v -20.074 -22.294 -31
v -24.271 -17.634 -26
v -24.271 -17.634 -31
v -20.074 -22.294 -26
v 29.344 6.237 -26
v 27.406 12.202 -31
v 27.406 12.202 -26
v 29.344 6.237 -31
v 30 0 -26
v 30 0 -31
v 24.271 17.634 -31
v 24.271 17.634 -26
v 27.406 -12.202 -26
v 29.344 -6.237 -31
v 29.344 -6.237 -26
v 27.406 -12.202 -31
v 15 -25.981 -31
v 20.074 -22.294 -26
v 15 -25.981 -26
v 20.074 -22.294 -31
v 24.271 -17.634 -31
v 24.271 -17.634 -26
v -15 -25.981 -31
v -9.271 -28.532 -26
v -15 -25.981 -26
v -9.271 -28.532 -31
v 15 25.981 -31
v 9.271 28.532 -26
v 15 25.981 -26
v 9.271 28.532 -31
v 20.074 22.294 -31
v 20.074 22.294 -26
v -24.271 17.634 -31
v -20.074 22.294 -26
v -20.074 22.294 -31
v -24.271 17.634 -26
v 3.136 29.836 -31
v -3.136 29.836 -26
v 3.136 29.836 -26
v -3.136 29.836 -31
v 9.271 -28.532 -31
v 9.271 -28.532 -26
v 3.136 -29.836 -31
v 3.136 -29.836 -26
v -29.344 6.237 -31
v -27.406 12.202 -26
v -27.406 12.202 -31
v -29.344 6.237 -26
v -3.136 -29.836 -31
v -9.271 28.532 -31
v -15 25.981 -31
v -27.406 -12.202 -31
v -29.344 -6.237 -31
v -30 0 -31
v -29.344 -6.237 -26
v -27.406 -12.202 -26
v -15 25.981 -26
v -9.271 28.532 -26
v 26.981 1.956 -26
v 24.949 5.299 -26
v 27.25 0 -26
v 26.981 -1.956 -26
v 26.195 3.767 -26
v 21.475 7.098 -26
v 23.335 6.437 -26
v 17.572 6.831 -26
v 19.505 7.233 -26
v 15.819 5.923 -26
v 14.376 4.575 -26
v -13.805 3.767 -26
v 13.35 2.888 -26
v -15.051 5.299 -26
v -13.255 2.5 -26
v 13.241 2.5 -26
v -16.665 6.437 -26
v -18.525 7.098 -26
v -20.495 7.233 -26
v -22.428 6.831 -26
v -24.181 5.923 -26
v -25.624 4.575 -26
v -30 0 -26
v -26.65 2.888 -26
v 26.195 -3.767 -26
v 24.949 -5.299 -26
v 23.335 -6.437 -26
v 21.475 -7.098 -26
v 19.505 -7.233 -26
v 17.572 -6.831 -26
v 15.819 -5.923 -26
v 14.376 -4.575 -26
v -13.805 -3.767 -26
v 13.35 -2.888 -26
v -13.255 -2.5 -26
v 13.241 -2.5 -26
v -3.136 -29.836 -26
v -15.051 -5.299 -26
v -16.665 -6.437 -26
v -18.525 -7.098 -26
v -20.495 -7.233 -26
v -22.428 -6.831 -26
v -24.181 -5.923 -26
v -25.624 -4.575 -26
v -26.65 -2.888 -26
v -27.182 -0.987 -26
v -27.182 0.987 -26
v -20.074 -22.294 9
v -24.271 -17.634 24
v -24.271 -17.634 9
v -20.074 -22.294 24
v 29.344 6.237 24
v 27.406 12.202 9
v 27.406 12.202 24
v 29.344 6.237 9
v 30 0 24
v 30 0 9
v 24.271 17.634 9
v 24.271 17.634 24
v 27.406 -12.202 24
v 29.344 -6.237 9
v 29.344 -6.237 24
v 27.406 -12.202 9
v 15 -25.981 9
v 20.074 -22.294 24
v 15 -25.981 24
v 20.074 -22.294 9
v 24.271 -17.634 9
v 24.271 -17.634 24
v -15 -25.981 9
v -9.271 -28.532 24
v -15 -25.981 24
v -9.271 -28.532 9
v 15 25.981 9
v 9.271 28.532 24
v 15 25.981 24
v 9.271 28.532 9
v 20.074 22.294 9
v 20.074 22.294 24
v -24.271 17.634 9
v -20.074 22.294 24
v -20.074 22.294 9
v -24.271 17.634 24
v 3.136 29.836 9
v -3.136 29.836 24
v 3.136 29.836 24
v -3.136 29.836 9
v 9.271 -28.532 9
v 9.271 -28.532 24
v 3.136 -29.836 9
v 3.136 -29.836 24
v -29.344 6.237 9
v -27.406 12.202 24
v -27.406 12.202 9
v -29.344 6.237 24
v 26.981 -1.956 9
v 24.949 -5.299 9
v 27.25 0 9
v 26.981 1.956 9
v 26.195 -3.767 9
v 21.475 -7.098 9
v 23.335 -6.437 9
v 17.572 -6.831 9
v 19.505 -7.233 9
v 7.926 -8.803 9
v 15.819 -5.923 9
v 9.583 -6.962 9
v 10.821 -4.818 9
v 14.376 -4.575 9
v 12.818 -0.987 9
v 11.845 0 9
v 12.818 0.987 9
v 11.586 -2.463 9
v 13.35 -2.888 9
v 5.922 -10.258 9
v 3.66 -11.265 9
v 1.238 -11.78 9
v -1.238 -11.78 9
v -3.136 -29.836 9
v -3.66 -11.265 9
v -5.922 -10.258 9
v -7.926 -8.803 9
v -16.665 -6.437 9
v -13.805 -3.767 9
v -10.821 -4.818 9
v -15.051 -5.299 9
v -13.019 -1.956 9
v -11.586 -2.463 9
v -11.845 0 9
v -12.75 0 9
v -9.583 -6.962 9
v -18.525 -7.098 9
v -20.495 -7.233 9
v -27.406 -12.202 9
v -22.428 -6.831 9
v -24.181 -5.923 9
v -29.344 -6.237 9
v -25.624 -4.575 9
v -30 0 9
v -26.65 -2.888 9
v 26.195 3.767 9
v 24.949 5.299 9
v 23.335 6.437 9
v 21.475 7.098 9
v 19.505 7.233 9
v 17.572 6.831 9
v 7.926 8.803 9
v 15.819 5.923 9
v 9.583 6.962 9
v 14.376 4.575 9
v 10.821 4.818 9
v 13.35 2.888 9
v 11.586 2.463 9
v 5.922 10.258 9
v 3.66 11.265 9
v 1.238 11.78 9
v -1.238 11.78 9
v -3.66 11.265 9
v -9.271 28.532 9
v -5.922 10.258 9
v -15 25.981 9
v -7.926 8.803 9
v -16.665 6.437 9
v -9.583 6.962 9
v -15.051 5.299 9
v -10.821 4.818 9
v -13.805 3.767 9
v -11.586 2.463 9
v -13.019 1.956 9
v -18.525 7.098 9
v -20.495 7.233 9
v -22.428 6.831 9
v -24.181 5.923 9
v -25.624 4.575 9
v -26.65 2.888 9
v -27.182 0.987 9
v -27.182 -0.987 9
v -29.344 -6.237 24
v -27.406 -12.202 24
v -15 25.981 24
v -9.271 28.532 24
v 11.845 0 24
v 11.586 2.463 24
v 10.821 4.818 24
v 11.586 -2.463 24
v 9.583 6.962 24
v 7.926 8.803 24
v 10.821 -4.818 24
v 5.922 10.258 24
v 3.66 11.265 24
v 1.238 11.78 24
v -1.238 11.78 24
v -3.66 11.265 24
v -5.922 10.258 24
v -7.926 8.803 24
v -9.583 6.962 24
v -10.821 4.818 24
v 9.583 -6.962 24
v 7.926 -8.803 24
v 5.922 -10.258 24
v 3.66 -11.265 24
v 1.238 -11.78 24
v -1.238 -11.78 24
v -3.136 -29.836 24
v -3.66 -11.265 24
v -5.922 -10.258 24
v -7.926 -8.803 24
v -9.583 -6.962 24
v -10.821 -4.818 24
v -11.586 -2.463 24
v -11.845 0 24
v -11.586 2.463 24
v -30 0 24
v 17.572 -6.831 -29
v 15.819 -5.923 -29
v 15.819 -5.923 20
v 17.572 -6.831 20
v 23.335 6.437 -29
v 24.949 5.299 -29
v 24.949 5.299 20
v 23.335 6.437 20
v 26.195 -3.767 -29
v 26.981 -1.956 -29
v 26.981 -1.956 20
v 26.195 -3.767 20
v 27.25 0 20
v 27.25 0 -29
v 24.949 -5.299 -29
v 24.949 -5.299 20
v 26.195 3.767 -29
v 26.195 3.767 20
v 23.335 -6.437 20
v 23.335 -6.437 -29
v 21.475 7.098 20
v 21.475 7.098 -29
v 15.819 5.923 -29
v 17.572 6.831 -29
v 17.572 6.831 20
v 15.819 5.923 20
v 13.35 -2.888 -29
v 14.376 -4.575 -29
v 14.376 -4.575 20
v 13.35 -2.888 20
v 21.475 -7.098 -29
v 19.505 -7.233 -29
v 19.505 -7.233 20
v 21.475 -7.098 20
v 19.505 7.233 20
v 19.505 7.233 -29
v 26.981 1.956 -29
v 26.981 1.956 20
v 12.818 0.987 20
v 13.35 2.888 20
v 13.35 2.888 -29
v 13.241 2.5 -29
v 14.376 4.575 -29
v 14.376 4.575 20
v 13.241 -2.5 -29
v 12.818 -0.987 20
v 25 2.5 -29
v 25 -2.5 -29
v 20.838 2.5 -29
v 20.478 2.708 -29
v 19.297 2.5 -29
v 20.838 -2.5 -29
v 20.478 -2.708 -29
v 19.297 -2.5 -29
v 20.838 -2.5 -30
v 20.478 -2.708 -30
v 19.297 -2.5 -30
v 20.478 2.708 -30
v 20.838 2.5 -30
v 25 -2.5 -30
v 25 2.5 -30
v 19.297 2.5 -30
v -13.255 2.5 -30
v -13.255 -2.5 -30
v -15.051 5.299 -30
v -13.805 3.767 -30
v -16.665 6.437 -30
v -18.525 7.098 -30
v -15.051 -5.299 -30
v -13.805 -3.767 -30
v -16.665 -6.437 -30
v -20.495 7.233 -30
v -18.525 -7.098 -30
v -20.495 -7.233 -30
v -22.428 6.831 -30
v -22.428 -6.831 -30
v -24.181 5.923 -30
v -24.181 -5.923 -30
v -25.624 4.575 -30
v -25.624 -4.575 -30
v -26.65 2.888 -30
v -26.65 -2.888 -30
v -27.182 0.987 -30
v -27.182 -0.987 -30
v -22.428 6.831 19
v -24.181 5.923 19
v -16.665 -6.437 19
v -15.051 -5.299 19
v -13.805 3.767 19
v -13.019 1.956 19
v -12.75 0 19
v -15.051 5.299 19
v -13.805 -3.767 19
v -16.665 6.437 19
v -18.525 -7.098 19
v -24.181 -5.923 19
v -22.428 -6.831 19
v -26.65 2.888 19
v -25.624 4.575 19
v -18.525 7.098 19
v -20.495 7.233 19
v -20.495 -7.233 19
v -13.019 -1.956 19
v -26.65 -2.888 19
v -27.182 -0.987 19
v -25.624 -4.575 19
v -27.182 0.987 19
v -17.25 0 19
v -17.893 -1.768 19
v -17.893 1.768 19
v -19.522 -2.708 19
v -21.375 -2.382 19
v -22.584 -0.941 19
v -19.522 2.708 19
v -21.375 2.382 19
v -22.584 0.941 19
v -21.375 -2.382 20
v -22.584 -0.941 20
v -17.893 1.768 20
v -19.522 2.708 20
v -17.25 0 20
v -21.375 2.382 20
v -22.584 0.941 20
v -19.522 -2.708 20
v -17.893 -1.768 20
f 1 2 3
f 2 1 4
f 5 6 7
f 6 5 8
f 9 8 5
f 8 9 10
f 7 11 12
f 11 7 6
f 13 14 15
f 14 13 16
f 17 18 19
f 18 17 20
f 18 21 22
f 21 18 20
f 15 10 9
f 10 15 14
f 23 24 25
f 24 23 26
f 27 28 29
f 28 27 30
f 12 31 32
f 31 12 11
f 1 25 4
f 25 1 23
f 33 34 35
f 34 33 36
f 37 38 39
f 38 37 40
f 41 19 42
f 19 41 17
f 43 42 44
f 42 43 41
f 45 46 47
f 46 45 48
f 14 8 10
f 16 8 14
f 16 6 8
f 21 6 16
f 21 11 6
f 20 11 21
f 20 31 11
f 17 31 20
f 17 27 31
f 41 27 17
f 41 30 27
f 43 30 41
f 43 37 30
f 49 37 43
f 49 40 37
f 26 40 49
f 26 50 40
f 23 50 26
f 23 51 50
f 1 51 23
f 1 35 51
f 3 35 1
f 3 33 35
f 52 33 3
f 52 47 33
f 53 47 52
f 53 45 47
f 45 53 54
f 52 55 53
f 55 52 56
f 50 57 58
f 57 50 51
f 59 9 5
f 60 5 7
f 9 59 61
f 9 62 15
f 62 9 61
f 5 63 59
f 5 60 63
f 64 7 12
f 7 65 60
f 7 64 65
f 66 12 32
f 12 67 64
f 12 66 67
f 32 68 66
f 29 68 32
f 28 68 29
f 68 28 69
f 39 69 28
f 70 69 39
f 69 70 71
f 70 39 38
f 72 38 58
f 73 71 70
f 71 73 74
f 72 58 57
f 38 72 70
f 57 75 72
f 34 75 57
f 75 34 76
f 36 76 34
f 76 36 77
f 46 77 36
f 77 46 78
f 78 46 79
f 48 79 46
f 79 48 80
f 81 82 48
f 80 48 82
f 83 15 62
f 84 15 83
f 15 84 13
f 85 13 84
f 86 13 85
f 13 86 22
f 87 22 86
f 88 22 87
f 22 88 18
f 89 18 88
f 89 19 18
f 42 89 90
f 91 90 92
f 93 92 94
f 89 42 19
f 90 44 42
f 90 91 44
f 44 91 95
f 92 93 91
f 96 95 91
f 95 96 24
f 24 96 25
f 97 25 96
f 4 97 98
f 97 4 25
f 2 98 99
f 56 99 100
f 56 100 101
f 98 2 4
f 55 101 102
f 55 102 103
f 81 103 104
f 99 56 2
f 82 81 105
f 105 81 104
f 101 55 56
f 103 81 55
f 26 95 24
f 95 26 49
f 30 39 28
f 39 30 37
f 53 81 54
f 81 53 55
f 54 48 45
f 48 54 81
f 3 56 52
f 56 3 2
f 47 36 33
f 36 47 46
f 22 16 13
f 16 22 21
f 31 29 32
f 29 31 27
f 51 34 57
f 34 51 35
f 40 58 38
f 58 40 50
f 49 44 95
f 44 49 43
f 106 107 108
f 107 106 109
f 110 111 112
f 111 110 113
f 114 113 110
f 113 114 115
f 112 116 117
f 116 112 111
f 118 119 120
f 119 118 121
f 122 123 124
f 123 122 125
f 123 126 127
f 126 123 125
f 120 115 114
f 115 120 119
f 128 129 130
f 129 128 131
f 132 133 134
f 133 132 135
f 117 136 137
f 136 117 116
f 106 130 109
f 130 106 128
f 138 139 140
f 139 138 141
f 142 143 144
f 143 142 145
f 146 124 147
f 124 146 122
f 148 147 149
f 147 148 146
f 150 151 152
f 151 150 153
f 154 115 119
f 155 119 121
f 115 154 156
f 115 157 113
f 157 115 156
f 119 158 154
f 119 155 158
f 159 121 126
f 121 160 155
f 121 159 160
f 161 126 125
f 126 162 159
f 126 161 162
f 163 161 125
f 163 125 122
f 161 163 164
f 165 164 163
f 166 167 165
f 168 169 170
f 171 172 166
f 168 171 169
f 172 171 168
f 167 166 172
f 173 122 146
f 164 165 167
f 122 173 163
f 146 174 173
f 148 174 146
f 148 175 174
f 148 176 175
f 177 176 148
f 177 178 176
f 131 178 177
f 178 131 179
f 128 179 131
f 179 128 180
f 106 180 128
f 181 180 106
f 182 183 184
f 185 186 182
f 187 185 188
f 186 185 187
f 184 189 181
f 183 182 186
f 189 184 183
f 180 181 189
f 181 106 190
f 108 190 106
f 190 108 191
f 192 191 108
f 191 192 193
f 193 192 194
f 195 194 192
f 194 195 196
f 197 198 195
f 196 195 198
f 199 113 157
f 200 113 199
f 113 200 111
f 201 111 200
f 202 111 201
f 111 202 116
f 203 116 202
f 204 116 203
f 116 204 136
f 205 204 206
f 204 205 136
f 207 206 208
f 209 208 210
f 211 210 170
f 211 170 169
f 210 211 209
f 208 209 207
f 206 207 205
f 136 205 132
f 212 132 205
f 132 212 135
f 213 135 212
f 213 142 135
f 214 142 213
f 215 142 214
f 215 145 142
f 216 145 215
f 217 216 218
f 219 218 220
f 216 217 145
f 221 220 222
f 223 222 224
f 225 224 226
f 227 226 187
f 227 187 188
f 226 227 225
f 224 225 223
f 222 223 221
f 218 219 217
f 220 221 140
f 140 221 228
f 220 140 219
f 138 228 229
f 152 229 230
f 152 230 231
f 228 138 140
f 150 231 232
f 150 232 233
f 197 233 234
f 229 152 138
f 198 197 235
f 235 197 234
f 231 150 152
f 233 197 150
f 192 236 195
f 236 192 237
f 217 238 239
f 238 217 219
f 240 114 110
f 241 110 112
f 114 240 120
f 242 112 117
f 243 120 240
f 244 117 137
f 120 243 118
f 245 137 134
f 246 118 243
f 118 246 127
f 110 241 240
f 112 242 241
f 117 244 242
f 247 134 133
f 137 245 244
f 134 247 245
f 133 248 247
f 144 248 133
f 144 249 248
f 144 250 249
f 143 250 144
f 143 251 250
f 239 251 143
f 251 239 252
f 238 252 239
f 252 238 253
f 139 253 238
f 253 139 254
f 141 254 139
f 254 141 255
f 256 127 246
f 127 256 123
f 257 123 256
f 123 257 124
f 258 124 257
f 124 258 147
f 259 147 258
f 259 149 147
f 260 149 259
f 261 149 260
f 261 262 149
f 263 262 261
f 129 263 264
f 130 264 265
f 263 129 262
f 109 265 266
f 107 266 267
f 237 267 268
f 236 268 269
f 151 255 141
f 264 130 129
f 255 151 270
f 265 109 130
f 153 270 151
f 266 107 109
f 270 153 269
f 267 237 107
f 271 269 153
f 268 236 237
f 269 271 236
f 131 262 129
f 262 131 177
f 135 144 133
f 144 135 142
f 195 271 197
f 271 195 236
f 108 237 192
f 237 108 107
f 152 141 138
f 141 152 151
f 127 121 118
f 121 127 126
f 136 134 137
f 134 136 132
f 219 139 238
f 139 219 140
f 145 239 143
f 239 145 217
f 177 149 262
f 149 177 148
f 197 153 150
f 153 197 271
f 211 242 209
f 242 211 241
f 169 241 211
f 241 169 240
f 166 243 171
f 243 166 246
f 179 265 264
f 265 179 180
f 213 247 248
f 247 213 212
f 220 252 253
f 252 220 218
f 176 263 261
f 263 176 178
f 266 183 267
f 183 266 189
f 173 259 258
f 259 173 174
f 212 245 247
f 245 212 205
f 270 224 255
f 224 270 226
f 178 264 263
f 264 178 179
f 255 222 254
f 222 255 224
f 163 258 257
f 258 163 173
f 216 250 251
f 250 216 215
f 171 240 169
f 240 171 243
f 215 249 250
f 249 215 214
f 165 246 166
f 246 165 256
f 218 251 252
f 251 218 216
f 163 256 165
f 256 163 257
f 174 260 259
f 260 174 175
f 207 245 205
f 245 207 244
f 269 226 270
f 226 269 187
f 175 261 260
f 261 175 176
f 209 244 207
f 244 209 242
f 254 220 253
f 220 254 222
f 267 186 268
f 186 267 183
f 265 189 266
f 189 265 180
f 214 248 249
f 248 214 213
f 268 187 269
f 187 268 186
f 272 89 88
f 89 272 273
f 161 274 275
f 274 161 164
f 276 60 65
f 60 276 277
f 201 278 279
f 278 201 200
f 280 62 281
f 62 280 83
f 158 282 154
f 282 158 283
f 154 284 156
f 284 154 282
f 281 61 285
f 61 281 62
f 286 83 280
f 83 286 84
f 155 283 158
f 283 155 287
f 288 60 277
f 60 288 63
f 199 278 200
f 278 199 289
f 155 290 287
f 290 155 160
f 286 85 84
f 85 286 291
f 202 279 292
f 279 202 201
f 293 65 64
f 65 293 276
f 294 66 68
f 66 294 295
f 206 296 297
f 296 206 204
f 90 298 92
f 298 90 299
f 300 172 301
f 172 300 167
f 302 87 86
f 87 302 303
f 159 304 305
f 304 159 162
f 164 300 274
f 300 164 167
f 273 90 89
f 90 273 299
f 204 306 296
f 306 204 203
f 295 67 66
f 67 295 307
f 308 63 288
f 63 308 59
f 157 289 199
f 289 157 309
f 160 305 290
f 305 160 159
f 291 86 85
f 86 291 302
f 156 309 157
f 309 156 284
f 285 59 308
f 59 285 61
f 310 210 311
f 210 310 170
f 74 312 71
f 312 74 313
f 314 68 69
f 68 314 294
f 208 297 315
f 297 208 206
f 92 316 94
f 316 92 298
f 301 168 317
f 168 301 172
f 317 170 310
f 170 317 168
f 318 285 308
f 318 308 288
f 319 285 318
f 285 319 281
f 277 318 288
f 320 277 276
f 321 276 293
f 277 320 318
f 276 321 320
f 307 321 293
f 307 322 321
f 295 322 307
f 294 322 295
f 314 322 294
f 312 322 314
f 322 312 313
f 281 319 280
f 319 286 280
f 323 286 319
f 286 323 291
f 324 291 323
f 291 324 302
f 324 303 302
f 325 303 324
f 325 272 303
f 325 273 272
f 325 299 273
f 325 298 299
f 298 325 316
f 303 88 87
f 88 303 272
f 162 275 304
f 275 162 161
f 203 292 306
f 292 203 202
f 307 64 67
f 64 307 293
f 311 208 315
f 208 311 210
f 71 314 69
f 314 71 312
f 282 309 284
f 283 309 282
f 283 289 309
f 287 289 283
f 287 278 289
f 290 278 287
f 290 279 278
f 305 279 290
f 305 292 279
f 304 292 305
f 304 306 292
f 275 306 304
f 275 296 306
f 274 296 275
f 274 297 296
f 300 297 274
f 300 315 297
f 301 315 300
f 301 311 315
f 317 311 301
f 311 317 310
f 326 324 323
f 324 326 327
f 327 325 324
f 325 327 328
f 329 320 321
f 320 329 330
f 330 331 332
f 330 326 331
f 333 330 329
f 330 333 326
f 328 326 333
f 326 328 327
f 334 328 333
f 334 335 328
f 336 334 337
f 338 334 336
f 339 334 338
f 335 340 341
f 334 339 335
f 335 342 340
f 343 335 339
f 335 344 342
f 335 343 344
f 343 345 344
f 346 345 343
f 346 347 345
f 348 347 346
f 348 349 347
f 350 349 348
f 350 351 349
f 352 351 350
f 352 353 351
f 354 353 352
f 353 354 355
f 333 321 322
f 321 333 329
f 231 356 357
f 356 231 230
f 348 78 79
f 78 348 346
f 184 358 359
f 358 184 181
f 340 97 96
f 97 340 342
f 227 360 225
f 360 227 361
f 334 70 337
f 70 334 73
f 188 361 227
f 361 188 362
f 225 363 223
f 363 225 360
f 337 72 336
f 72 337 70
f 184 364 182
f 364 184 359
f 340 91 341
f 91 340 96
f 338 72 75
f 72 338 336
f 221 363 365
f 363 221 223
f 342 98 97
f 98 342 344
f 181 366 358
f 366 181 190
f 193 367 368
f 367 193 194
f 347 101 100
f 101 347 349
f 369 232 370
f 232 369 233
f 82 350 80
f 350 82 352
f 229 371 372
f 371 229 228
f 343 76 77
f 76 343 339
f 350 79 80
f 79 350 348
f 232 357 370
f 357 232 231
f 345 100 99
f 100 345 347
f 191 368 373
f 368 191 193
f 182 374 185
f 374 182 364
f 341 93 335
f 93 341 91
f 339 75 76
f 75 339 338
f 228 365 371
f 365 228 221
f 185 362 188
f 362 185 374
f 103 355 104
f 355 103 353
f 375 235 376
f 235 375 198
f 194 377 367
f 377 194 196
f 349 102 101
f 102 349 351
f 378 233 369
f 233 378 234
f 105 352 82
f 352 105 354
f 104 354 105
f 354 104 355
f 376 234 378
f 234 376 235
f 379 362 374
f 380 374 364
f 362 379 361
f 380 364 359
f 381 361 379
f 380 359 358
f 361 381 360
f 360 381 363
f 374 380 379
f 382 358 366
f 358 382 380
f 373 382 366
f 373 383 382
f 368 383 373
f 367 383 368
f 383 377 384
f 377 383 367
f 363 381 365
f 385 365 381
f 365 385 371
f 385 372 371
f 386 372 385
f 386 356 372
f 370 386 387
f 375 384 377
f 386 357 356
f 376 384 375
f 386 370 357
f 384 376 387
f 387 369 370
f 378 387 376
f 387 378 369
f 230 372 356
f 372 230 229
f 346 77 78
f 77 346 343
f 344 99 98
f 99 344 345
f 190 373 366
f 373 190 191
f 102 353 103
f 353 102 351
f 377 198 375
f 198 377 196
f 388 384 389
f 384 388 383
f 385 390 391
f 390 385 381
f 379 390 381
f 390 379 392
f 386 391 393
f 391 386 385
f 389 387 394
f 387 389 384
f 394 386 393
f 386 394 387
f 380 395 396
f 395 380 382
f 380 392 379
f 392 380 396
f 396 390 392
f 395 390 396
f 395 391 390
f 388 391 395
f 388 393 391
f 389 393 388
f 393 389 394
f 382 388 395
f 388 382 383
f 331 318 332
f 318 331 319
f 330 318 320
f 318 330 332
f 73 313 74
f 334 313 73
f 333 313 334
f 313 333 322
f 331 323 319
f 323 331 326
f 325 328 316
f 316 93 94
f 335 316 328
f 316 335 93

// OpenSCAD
// file: AA_cell.scad
// AA cell
module AA_cell(){
    TERMINAL_LENGTH = 1;
    TERMINAL_DIAMETER = 5.5;
    BODY_LENGTH = 49;
    BODY_DIAMETER = 14.5;

    cylinder(r=BODY_DIAMETER/2, h=BODY_LENGTH);
    translate([0,0,BODY_LENGTH]){
        cylinder(r=TERMINAL_DIAMETER/2, h=TERMINAL_LENGTH);
    }
}
// file: hobby_motor.scad
// Cheap hobby motor
module hobby_motor(){

    TAIL_HUB_LENGTH = 2.1;
    TAIL_HUB_DIAMETER = 8.61;
    TAIL_LENGTH = 1.82;
    TAIL_DIAMETER = 24.07;
    BODY_LENGTH = 21.51;
    BODY_DIAMETER = 23.69;
    FACE_LENGTH = 3.68;
    FACE_DIAMETER = 19.0;
    FACE_HUB_LENGTH = 1.53;
    FACE_HUB_DIAMETER = 6.05;
    FACE_HOLE_DIAMETER = 2.27;
    SHAFT_LENGTH = 6.39;
    SHAFT_DIAMETER = 2.02;

    // tail
    cylinder(r=TAIL_HUB_DIAMETER/2, h=TAIL_HUB_LENGTH);
    // tail hub
    translate([0,0,TAIL_HUB_LENGTH]){
        cylinder(r=TAIL_DIAMETER / 2, h=TAIL_LENGTH);
        // body
        translate([0,0,TAIL_LENGTH]){
            cylinder(r=BODY_DIAMETER/2, h=BODY_LENGTH);
            // face
            translate([0,0,BODY_LENGTH]){
                difference(){
                    cylinder(r=FACE_DIAMETER/2, h=FACE_LENGTH);
                    // face holes (mounting holes?)
                    translate([-5,0,1]){
                        cylinder(r=FACE_HOLE_DIAMETER/2, h=FACE_LENGTH);
                    }
                    translate([5,0,1]){
                        cylinder(r=FACE_HOLE_DIAMETER/2, h=FACE_LENGTH);
                    }
                }
                // shaft
                translate([0,0,FACE_LENGTH]){
                    cylinder(r=SHAFT_DIAMETER/2, h=SHAFT_LENGTH);
                }
            }
        }
    }
}
// main file
include <hobby_motor.scad>
include <AA_cell.scad>

difference(){
    
    translate([0,0,-31]){
        cylinder(r=30, h=5);
        
        translate([0,0,40]){
            cylinder(r=30, h=15);
        }
    }
    
    translate([0,0,-30]){
        translate([-25,-2.5,0]){
            cube([50,5,5]);
        }
    }

    #hobby_motor();

    translate([20,0,20]){
        rotate([180,0,0]){
            #AA_cell();
        }
    }
    translate([-20,0,-30]){
        #AA_cell();
    }
}
